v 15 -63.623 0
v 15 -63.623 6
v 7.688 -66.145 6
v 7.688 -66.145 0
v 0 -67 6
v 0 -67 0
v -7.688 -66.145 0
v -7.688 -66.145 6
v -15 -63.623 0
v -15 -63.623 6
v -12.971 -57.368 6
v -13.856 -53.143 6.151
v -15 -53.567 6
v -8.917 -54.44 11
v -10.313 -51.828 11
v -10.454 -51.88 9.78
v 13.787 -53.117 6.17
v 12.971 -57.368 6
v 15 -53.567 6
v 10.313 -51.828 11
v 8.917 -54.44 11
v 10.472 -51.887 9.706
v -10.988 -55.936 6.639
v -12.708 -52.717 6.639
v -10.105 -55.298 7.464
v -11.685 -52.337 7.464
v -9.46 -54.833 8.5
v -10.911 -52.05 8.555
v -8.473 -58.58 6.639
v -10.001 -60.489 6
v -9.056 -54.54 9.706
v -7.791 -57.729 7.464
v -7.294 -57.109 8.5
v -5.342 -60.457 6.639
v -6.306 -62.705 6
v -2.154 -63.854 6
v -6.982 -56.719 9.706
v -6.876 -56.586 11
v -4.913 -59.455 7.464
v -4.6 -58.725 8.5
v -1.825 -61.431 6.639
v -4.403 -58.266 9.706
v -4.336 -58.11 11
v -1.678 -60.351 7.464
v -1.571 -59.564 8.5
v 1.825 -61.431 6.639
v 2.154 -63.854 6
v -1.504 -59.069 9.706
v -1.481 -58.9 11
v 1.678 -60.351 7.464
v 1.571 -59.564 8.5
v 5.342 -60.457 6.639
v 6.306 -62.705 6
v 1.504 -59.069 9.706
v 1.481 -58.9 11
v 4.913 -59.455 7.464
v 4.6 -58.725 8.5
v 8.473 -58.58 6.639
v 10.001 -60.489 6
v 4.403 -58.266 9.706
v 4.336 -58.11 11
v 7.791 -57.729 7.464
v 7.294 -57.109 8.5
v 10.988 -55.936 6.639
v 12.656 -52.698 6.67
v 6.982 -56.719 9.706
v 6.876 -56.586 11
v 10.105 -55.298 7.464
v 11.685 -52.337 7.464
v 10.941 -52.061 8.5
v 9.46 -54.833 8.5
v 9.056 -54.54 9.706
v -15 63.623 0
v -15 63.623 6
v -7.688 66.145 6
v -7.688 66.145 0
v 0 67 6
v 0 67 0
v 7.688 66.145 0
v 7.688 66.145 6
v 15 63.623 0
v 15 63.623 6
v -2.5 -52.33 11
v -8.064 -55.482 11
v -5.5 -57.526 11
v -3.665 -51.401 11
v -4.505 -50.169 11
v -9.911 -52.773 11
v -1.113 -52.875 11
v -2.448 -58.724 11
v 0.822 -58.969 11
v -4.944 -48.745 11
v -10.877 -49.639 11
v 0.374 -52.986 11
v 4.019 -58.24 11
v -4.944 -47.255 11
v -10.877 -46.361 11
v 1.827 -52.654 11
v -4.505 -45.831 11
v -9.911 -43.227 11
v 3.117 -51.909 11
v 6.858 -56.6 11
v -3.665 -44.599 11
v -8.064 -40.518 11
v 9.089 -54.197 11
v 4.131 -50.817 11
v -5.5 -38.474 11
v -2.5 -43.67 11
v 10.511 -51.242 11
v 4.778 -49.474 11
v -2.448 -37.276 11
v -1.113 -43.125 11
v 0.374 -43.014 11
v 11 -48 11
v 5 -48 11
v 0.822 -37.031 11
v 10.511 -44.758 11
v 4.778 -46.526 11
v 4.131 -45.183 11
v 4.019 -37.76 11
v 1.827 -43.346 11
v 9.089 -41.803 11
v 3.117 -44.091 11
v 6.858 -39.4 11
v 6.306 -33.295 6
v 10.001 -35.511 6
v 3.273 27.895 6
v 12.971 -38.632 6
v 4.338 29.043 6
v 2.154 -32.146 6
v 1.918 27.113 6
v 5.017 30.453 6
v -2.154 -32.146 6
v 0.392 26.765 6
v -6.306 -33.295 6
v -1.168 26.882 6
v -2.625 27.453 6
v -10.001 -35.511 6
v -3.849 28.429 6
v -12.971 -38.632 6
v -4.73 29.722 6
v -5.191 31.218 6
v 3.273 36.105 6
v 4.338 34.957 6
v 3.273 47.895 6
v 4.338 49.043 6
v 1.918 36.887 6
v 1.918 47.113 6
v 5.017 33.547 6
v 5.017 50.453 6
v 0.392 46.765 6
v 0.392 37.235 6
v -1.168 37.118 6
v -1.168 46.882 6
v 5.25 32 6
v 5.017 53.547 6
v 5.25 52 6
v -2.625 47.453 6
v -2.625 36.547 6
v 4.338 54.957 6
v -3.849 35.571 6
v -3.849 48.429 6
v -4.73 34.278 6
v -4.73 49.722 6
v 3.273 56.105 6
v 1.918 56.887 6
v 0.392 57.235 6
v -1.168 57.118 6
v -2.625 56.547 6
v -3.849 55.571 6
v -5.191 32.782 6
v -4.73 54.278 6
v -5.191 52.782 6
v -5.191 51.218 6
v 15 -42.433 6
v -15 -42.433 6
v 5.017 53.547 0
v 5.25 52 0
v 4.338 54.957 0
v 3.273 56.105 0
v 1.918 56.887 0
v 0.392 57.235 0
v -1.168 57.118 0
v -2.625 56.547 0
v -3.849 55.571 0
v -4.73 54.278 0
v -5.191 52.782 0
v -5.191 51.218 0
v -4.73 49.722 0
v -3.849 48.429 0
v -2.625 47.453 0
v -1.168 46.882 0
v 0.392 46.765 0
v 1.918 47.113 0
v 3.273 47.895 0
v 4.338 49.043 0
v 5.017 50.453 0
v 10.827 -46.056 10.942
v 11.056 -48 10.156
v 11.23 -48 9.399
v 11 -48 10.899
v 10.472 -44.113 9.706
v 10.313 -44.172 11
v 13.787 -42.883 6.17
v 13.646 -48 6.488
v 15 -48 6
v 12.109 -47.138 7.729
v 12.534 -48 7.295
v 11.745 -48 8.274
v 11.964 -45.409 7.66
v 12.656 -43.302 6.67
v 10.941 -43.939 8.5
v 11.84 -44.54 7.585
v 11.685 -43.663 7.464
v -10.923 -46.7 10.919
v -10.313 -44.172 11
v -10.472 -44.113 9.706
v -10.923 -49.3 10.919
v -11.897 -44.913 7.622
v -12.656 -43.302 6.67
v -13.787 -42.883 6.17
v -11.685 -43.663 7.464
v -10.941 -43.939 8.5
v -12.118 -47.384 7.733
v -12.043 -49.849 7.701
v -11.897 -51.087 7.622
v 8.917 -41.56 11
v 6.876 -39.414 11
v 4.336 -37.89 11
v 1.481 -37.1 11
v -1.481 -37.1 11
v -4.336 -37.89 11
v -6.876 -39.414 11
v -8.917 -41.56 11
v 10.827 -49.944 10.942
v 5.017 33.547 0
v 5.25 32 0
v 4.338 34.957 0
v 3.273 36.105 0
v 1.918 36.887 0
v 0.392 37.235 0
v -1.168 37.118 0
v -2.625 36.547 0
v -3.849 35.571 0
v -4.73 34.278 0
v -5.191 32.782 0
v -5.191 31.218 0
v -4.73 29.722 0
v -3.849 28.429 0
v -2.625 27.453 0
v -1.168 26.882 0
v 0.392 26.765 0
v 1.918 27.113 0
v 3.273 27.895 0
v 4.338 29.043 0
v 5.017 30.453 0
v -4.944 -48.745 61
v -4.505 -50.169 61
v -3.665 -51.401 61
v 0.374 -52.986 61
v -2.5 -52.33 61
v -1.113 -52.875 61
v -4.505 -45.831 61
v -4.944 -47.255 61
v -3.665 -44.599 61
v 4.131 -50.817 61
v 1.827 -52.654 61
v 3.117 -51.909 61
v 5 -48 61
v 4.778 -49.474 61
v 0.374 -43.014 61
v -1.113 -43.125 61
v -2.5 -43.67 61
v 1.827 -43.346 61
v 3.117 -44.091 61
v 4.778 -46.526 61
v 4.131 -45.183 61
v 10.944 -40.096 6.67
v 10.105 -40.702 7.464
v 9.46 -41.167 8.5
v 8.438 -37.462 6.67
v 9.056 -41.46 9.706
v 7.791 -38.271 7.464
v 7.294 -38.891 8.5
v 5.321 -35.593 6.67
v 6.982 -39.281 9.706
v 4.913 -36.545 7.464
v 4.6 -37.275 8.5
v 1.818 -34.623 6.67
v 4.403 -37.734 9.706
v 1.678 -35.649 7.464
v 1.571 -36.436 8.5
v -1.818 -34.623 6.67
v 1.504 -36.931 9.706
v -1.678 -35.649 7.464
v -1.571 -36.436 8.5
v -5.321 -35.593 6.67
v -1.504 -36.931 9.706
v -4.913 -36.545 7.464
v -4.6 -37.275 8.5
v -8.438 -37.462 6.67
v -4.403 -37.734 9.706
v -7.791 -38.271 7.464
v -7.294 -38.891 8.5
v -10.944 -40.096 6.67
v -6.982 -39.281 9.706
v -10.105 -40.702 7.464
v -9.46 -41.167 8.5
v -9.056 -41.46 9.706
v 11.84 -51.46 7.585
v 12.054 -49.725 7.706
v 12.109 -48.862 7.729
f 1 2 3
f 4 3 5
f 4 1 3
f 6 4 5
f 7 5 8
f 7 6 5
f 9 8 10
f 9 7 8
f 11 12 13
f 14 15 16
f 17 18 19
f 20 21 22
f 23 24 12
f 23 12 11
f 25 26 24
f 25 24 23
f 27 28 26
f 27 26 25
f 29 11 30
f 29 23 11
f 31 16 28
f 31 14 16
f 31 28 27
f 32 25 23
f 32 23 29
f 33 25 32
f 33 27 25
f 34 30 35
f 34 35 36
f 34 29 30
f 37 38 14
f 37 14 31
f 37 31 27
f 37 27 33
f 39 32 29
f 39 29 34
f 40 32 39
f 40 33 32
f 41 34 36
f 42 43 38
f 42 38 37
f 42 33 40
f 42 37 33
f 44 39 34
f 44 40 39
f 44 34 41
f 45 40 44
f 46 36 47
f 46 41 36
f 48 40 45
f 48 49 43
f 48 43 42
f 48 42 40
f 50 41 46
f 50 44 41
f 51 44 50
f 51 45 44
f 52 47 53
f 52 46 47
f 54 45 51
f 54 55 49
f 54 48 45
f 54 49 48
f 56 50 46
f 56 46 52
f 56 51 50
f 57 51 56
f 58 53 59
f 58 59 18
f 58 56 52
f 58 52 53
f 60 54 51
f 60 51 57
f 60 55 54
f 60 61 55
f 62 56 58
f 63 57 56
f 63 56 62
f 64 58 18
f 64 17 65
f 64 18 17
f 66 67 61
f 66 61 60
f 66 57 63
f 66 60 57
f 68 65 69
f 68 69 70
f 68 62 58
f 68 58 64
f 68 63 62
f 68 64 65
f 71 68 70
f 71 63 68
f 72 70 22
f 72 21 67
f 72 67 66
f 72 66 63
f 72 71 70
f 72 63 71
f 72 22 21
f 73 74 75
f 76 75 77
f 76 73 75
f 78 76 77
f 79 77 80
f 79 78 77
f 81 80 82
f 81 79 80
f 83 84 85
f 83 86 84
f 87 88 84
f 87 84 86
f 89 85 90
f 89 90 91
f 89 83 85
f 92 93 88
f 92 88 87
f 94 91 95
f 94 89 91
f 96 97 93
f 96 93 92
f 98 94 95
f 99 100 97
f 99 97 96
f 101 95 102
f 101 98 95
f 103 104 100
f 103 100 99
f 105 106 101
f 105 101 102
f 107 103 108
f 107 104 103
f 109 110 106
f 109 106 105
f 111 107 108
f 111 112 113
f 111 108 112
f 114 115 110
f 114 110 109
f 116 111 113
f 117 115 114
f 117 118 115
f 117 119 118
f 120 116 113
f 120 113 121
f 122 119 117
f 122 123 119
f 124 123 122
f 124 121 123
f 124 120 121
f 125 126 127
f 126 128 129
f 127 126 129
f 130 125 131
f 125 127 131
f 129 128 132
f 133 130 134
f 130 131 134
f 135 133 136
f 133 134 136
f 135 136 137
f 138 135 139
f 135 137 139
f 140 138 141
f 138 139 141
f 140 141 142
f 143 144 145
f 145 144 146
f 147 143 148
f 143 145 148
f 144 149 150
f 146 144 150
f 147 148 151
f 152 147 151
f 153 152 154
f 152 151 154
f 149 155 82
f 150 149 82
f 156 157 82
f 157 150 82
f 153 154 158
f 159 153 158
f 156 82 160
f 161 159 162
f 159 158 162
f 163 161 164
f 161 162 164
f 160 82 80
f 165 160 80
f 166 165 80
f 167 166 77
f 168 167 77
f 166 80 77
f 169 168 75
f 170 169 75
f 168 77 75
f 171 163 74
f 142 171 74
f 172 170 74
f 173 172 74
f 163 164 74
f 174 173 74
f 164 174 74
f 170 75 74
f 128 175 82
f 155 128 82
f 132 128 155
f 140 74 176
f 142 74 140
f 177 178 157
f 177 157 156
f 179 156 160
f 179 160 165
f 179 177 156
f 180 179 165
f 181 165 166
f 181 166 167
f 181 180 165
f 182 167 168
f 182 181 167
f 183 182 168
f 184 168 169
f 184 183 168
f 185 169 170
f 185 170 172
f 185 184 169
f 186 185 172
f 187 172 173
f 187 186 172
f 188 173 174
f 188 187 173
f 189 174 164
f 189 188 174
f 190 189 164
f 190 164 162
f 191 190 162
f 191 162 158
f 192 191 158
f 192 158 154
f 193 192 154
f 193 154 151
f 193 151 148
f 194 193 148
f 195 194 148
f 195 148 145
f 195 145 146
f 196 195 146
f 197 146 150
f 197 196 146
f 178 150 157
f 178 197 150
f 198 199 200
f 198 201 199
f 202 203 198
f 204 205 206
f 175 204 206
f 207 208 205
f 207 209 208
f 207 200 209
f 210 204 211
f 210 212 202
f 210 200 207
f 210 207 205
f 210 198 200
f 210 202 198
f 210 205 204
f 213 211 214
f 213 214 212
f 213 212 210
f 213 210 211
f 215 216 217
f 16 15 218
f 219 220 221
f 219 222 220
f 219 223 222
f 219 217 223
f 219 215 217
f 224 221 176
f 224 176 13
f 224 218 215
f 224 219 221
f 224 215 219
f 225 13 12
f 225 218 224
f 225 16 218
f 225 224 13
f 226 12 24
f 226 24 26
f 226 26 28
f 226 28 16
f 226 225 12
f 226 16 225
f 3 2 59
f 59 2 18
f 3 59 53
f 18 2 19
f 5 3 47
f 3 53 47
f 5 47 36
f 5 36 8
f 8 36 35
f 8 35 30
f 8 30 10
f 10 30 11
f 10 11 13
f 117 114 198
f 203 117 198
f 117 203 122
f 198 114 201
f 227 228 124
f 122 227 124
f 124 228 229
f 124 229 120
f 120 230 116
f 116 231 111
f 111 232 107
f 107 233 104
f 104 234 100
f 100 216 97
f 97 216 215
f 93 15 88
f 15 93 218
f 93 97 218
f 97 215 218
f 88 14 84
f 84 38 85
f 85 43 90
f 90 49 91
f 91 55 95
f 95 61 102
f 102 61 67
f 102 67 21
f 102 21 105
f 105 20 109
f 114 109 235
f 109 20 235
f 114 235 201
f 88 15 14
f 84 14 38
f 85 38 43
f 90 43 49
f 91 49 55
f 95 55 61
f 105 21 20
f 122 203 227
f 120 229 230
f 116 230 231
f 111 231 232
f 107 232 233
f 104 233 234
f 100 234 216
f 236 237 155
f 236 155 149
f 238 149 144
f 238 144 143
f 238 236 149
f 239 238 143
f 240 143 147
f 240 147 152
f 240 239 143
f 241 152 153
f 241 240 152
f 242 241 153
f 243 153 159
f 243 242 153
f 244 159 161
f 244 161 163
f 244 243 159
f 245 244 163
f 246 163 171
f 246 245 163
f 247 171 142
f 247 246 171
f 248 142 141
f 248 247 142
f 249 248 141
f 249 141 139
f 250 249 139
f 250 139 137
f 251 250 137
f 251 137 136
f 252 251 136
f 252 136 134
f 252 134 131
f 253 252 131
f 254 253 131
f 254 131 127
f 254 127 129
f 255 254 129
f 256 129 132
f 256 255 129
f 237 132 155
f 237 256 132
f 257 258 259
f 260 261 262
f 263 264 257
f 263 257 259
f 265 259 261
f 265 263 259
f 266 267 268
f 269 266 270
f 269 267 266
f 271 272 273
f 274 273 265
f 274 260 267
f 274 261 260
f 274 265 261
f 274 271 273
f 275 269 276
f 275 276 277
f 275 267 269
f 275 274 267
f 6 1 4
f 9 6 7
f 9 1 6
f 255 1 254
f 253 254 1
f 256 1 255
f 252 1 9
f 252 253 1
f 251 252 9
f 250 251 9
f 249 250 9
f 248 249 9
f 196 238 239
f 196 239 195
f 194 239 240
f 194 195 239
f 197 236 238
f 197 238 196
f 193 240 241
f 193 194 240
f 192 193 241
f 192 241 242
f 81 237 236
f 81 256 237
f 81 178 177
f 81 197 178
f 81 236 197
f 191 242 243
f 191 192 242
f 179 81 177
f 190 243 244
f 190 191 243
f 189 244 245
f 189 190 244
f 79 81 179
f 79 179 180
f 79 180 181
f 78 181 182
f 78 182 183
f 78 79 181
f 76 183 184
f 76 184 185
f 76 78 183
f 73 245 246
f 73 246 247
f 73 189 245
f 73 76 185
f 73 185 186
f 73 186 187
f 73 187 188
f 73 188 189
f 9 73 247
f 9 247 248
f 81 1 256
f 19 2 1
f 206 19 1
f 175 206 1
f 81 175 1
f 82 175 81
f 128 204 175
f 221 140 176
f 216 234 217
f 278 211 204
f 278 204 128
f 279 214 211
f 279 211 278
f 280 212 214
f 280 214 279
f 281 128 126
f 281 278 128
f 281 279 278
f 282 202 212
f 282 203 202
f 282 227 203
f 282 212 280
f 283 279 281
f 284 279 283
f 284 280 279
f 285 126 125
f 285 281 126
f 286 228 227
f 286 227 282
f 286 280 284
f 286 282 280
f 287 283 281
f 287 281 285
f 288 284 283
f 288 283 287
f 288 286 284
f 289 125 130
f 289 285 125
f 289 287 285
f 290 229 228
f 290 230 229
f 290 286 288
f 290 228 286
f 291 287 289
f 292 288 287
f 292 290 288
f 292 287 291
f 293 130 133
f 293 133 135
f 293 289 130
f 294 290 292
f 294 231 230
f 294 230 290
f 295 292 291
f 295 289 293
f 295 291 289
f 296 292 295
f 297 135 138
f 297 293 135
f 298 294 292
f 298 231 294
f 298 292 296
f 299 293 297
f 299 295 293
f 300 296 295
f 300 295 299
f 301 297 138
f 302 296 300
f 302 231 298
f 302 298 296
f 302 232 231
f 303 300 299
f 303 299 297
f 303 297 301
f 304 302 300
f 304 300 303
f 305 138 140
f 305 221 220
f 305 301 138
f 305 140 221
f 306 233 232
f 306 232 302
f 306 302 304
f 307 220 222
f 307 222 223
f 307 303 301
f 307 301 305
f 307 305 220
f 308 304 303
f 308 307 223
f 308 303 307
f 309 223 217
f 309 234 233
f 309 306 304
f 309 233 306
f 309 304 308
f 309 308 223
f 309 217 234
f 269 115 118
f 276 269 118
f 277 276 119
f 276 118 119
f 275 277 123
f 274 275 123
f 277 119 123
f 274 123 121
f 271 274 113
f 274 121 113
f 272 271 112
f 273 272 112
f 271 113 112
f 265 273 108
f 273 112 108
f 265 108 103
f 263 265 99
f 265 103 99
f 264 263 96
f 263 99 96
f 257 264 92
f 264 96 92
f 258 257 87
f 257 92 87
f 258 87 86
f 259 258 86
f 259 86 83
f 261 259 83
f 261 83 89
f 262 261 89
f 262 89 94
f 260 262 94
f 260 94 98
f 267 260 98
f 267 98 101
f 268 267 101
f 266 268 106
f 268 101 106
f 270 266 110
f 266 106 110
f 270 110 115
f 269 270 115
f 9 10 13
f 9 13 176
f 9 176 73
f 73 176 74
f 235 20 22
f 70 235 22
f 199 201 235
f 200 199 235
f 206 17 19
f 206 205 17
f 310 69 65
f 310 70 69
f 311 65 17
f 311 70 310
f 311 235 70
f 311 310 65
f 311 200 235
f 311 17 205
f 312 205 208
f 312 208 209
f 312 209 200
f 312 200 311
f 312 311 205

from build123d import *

# Parameters (mm, degrees)
SKICA1_R                 = 5.25
P_IDAT_VYSUNUT_M1_DEPTH  = 6
SKICA2_R                 = 11
P_IDAT_VYSUNUT_M2_DEPTH  = 5
SKICA3_W                 = 36.875028654
SKICA3_H                 = 156.768575318
SKICA3_W_2               = 39.825030946
SKICA3_H_2               = 162.668579902
ODEBRAT_VYSUNUT_M1_DEPTH = 10
ZAOBLIT1_R               = 5
SKICA4_R                 = 5
P_IDAT_VYSUNUT_M3_DEPTH  = 50


with BuildPart() as part:
    # Skica1 → Přidat vysunutím1 (new body)
    with BuildSketch(Plane.XY):
        with BuildLine():
            Line((-17.5, -62.310889132), (-17.5, 62.310889132))
            ThreePointArc((-17.5, 62.310889132), (0, 67), (17.5, 62.310889132))
            Line((17.5, 62.310889132), (17.5, -62.310889132))
            ThreePointArc((17.5, -62.310889132), (0, -67), (-17.5, -62.310889132))
        make_face()
        with Locations((0, 52)):
            Circle(SKICA1_R, mode=Mode.SUBTRACT)
        with Locations((0, 32)):
            Circle(SKICA1_R, mode=Mode.SUBTRACT)
    extrude(amount=P_IDAT_VYSUNUT_M1_DEPTH)

    # Skica2 → Přidat vysunutím2 (add)
    with BuildSketch(Plane.XY.offset(6)):
        with Locations((0, -48)):
            Circle(SKICA2_R)
    extrude(amount=P_IDAT_VYSUNUT_M2_DEPTH)

    # Skica3 → Odebrat vysunutím1 (cut)
    with BuildSketch(Plane.XY.offset(6)):
        with Locations((33.437514327, 0)):
            Rectangle(SKICA3_W, SKICA3_H)
        with Locations((-34.912515473, 0)):
            Rectangle(SKICA3_W_2, SKICA3_H_2)
    extrude(amount=-ODEBRAT_VYSUNUT_M1_DEPTH, mode=Mode.SUBTRACT)

    # Zaoblit1
    zaoblit1_edges = [part.edges().sort_by_distance(p)[0] for p in [
        (-11, -48, 6),
    ]]
    fillet(zaoblit1_edges, radius=ZAOBLIT1_R - 0.0001)  # a hair under: the kernel refuses the full size

    # Skica4 → Přidat vysunutím3 (add)
    with BuildSketch(Plane.XY.offset(11)):
        with Locations((0, -48)):
            Circle(SKICA4_R)
    extrude(amount=P_IDAT_VYSUNUT_M3_DEPTH)


solid = part.part
